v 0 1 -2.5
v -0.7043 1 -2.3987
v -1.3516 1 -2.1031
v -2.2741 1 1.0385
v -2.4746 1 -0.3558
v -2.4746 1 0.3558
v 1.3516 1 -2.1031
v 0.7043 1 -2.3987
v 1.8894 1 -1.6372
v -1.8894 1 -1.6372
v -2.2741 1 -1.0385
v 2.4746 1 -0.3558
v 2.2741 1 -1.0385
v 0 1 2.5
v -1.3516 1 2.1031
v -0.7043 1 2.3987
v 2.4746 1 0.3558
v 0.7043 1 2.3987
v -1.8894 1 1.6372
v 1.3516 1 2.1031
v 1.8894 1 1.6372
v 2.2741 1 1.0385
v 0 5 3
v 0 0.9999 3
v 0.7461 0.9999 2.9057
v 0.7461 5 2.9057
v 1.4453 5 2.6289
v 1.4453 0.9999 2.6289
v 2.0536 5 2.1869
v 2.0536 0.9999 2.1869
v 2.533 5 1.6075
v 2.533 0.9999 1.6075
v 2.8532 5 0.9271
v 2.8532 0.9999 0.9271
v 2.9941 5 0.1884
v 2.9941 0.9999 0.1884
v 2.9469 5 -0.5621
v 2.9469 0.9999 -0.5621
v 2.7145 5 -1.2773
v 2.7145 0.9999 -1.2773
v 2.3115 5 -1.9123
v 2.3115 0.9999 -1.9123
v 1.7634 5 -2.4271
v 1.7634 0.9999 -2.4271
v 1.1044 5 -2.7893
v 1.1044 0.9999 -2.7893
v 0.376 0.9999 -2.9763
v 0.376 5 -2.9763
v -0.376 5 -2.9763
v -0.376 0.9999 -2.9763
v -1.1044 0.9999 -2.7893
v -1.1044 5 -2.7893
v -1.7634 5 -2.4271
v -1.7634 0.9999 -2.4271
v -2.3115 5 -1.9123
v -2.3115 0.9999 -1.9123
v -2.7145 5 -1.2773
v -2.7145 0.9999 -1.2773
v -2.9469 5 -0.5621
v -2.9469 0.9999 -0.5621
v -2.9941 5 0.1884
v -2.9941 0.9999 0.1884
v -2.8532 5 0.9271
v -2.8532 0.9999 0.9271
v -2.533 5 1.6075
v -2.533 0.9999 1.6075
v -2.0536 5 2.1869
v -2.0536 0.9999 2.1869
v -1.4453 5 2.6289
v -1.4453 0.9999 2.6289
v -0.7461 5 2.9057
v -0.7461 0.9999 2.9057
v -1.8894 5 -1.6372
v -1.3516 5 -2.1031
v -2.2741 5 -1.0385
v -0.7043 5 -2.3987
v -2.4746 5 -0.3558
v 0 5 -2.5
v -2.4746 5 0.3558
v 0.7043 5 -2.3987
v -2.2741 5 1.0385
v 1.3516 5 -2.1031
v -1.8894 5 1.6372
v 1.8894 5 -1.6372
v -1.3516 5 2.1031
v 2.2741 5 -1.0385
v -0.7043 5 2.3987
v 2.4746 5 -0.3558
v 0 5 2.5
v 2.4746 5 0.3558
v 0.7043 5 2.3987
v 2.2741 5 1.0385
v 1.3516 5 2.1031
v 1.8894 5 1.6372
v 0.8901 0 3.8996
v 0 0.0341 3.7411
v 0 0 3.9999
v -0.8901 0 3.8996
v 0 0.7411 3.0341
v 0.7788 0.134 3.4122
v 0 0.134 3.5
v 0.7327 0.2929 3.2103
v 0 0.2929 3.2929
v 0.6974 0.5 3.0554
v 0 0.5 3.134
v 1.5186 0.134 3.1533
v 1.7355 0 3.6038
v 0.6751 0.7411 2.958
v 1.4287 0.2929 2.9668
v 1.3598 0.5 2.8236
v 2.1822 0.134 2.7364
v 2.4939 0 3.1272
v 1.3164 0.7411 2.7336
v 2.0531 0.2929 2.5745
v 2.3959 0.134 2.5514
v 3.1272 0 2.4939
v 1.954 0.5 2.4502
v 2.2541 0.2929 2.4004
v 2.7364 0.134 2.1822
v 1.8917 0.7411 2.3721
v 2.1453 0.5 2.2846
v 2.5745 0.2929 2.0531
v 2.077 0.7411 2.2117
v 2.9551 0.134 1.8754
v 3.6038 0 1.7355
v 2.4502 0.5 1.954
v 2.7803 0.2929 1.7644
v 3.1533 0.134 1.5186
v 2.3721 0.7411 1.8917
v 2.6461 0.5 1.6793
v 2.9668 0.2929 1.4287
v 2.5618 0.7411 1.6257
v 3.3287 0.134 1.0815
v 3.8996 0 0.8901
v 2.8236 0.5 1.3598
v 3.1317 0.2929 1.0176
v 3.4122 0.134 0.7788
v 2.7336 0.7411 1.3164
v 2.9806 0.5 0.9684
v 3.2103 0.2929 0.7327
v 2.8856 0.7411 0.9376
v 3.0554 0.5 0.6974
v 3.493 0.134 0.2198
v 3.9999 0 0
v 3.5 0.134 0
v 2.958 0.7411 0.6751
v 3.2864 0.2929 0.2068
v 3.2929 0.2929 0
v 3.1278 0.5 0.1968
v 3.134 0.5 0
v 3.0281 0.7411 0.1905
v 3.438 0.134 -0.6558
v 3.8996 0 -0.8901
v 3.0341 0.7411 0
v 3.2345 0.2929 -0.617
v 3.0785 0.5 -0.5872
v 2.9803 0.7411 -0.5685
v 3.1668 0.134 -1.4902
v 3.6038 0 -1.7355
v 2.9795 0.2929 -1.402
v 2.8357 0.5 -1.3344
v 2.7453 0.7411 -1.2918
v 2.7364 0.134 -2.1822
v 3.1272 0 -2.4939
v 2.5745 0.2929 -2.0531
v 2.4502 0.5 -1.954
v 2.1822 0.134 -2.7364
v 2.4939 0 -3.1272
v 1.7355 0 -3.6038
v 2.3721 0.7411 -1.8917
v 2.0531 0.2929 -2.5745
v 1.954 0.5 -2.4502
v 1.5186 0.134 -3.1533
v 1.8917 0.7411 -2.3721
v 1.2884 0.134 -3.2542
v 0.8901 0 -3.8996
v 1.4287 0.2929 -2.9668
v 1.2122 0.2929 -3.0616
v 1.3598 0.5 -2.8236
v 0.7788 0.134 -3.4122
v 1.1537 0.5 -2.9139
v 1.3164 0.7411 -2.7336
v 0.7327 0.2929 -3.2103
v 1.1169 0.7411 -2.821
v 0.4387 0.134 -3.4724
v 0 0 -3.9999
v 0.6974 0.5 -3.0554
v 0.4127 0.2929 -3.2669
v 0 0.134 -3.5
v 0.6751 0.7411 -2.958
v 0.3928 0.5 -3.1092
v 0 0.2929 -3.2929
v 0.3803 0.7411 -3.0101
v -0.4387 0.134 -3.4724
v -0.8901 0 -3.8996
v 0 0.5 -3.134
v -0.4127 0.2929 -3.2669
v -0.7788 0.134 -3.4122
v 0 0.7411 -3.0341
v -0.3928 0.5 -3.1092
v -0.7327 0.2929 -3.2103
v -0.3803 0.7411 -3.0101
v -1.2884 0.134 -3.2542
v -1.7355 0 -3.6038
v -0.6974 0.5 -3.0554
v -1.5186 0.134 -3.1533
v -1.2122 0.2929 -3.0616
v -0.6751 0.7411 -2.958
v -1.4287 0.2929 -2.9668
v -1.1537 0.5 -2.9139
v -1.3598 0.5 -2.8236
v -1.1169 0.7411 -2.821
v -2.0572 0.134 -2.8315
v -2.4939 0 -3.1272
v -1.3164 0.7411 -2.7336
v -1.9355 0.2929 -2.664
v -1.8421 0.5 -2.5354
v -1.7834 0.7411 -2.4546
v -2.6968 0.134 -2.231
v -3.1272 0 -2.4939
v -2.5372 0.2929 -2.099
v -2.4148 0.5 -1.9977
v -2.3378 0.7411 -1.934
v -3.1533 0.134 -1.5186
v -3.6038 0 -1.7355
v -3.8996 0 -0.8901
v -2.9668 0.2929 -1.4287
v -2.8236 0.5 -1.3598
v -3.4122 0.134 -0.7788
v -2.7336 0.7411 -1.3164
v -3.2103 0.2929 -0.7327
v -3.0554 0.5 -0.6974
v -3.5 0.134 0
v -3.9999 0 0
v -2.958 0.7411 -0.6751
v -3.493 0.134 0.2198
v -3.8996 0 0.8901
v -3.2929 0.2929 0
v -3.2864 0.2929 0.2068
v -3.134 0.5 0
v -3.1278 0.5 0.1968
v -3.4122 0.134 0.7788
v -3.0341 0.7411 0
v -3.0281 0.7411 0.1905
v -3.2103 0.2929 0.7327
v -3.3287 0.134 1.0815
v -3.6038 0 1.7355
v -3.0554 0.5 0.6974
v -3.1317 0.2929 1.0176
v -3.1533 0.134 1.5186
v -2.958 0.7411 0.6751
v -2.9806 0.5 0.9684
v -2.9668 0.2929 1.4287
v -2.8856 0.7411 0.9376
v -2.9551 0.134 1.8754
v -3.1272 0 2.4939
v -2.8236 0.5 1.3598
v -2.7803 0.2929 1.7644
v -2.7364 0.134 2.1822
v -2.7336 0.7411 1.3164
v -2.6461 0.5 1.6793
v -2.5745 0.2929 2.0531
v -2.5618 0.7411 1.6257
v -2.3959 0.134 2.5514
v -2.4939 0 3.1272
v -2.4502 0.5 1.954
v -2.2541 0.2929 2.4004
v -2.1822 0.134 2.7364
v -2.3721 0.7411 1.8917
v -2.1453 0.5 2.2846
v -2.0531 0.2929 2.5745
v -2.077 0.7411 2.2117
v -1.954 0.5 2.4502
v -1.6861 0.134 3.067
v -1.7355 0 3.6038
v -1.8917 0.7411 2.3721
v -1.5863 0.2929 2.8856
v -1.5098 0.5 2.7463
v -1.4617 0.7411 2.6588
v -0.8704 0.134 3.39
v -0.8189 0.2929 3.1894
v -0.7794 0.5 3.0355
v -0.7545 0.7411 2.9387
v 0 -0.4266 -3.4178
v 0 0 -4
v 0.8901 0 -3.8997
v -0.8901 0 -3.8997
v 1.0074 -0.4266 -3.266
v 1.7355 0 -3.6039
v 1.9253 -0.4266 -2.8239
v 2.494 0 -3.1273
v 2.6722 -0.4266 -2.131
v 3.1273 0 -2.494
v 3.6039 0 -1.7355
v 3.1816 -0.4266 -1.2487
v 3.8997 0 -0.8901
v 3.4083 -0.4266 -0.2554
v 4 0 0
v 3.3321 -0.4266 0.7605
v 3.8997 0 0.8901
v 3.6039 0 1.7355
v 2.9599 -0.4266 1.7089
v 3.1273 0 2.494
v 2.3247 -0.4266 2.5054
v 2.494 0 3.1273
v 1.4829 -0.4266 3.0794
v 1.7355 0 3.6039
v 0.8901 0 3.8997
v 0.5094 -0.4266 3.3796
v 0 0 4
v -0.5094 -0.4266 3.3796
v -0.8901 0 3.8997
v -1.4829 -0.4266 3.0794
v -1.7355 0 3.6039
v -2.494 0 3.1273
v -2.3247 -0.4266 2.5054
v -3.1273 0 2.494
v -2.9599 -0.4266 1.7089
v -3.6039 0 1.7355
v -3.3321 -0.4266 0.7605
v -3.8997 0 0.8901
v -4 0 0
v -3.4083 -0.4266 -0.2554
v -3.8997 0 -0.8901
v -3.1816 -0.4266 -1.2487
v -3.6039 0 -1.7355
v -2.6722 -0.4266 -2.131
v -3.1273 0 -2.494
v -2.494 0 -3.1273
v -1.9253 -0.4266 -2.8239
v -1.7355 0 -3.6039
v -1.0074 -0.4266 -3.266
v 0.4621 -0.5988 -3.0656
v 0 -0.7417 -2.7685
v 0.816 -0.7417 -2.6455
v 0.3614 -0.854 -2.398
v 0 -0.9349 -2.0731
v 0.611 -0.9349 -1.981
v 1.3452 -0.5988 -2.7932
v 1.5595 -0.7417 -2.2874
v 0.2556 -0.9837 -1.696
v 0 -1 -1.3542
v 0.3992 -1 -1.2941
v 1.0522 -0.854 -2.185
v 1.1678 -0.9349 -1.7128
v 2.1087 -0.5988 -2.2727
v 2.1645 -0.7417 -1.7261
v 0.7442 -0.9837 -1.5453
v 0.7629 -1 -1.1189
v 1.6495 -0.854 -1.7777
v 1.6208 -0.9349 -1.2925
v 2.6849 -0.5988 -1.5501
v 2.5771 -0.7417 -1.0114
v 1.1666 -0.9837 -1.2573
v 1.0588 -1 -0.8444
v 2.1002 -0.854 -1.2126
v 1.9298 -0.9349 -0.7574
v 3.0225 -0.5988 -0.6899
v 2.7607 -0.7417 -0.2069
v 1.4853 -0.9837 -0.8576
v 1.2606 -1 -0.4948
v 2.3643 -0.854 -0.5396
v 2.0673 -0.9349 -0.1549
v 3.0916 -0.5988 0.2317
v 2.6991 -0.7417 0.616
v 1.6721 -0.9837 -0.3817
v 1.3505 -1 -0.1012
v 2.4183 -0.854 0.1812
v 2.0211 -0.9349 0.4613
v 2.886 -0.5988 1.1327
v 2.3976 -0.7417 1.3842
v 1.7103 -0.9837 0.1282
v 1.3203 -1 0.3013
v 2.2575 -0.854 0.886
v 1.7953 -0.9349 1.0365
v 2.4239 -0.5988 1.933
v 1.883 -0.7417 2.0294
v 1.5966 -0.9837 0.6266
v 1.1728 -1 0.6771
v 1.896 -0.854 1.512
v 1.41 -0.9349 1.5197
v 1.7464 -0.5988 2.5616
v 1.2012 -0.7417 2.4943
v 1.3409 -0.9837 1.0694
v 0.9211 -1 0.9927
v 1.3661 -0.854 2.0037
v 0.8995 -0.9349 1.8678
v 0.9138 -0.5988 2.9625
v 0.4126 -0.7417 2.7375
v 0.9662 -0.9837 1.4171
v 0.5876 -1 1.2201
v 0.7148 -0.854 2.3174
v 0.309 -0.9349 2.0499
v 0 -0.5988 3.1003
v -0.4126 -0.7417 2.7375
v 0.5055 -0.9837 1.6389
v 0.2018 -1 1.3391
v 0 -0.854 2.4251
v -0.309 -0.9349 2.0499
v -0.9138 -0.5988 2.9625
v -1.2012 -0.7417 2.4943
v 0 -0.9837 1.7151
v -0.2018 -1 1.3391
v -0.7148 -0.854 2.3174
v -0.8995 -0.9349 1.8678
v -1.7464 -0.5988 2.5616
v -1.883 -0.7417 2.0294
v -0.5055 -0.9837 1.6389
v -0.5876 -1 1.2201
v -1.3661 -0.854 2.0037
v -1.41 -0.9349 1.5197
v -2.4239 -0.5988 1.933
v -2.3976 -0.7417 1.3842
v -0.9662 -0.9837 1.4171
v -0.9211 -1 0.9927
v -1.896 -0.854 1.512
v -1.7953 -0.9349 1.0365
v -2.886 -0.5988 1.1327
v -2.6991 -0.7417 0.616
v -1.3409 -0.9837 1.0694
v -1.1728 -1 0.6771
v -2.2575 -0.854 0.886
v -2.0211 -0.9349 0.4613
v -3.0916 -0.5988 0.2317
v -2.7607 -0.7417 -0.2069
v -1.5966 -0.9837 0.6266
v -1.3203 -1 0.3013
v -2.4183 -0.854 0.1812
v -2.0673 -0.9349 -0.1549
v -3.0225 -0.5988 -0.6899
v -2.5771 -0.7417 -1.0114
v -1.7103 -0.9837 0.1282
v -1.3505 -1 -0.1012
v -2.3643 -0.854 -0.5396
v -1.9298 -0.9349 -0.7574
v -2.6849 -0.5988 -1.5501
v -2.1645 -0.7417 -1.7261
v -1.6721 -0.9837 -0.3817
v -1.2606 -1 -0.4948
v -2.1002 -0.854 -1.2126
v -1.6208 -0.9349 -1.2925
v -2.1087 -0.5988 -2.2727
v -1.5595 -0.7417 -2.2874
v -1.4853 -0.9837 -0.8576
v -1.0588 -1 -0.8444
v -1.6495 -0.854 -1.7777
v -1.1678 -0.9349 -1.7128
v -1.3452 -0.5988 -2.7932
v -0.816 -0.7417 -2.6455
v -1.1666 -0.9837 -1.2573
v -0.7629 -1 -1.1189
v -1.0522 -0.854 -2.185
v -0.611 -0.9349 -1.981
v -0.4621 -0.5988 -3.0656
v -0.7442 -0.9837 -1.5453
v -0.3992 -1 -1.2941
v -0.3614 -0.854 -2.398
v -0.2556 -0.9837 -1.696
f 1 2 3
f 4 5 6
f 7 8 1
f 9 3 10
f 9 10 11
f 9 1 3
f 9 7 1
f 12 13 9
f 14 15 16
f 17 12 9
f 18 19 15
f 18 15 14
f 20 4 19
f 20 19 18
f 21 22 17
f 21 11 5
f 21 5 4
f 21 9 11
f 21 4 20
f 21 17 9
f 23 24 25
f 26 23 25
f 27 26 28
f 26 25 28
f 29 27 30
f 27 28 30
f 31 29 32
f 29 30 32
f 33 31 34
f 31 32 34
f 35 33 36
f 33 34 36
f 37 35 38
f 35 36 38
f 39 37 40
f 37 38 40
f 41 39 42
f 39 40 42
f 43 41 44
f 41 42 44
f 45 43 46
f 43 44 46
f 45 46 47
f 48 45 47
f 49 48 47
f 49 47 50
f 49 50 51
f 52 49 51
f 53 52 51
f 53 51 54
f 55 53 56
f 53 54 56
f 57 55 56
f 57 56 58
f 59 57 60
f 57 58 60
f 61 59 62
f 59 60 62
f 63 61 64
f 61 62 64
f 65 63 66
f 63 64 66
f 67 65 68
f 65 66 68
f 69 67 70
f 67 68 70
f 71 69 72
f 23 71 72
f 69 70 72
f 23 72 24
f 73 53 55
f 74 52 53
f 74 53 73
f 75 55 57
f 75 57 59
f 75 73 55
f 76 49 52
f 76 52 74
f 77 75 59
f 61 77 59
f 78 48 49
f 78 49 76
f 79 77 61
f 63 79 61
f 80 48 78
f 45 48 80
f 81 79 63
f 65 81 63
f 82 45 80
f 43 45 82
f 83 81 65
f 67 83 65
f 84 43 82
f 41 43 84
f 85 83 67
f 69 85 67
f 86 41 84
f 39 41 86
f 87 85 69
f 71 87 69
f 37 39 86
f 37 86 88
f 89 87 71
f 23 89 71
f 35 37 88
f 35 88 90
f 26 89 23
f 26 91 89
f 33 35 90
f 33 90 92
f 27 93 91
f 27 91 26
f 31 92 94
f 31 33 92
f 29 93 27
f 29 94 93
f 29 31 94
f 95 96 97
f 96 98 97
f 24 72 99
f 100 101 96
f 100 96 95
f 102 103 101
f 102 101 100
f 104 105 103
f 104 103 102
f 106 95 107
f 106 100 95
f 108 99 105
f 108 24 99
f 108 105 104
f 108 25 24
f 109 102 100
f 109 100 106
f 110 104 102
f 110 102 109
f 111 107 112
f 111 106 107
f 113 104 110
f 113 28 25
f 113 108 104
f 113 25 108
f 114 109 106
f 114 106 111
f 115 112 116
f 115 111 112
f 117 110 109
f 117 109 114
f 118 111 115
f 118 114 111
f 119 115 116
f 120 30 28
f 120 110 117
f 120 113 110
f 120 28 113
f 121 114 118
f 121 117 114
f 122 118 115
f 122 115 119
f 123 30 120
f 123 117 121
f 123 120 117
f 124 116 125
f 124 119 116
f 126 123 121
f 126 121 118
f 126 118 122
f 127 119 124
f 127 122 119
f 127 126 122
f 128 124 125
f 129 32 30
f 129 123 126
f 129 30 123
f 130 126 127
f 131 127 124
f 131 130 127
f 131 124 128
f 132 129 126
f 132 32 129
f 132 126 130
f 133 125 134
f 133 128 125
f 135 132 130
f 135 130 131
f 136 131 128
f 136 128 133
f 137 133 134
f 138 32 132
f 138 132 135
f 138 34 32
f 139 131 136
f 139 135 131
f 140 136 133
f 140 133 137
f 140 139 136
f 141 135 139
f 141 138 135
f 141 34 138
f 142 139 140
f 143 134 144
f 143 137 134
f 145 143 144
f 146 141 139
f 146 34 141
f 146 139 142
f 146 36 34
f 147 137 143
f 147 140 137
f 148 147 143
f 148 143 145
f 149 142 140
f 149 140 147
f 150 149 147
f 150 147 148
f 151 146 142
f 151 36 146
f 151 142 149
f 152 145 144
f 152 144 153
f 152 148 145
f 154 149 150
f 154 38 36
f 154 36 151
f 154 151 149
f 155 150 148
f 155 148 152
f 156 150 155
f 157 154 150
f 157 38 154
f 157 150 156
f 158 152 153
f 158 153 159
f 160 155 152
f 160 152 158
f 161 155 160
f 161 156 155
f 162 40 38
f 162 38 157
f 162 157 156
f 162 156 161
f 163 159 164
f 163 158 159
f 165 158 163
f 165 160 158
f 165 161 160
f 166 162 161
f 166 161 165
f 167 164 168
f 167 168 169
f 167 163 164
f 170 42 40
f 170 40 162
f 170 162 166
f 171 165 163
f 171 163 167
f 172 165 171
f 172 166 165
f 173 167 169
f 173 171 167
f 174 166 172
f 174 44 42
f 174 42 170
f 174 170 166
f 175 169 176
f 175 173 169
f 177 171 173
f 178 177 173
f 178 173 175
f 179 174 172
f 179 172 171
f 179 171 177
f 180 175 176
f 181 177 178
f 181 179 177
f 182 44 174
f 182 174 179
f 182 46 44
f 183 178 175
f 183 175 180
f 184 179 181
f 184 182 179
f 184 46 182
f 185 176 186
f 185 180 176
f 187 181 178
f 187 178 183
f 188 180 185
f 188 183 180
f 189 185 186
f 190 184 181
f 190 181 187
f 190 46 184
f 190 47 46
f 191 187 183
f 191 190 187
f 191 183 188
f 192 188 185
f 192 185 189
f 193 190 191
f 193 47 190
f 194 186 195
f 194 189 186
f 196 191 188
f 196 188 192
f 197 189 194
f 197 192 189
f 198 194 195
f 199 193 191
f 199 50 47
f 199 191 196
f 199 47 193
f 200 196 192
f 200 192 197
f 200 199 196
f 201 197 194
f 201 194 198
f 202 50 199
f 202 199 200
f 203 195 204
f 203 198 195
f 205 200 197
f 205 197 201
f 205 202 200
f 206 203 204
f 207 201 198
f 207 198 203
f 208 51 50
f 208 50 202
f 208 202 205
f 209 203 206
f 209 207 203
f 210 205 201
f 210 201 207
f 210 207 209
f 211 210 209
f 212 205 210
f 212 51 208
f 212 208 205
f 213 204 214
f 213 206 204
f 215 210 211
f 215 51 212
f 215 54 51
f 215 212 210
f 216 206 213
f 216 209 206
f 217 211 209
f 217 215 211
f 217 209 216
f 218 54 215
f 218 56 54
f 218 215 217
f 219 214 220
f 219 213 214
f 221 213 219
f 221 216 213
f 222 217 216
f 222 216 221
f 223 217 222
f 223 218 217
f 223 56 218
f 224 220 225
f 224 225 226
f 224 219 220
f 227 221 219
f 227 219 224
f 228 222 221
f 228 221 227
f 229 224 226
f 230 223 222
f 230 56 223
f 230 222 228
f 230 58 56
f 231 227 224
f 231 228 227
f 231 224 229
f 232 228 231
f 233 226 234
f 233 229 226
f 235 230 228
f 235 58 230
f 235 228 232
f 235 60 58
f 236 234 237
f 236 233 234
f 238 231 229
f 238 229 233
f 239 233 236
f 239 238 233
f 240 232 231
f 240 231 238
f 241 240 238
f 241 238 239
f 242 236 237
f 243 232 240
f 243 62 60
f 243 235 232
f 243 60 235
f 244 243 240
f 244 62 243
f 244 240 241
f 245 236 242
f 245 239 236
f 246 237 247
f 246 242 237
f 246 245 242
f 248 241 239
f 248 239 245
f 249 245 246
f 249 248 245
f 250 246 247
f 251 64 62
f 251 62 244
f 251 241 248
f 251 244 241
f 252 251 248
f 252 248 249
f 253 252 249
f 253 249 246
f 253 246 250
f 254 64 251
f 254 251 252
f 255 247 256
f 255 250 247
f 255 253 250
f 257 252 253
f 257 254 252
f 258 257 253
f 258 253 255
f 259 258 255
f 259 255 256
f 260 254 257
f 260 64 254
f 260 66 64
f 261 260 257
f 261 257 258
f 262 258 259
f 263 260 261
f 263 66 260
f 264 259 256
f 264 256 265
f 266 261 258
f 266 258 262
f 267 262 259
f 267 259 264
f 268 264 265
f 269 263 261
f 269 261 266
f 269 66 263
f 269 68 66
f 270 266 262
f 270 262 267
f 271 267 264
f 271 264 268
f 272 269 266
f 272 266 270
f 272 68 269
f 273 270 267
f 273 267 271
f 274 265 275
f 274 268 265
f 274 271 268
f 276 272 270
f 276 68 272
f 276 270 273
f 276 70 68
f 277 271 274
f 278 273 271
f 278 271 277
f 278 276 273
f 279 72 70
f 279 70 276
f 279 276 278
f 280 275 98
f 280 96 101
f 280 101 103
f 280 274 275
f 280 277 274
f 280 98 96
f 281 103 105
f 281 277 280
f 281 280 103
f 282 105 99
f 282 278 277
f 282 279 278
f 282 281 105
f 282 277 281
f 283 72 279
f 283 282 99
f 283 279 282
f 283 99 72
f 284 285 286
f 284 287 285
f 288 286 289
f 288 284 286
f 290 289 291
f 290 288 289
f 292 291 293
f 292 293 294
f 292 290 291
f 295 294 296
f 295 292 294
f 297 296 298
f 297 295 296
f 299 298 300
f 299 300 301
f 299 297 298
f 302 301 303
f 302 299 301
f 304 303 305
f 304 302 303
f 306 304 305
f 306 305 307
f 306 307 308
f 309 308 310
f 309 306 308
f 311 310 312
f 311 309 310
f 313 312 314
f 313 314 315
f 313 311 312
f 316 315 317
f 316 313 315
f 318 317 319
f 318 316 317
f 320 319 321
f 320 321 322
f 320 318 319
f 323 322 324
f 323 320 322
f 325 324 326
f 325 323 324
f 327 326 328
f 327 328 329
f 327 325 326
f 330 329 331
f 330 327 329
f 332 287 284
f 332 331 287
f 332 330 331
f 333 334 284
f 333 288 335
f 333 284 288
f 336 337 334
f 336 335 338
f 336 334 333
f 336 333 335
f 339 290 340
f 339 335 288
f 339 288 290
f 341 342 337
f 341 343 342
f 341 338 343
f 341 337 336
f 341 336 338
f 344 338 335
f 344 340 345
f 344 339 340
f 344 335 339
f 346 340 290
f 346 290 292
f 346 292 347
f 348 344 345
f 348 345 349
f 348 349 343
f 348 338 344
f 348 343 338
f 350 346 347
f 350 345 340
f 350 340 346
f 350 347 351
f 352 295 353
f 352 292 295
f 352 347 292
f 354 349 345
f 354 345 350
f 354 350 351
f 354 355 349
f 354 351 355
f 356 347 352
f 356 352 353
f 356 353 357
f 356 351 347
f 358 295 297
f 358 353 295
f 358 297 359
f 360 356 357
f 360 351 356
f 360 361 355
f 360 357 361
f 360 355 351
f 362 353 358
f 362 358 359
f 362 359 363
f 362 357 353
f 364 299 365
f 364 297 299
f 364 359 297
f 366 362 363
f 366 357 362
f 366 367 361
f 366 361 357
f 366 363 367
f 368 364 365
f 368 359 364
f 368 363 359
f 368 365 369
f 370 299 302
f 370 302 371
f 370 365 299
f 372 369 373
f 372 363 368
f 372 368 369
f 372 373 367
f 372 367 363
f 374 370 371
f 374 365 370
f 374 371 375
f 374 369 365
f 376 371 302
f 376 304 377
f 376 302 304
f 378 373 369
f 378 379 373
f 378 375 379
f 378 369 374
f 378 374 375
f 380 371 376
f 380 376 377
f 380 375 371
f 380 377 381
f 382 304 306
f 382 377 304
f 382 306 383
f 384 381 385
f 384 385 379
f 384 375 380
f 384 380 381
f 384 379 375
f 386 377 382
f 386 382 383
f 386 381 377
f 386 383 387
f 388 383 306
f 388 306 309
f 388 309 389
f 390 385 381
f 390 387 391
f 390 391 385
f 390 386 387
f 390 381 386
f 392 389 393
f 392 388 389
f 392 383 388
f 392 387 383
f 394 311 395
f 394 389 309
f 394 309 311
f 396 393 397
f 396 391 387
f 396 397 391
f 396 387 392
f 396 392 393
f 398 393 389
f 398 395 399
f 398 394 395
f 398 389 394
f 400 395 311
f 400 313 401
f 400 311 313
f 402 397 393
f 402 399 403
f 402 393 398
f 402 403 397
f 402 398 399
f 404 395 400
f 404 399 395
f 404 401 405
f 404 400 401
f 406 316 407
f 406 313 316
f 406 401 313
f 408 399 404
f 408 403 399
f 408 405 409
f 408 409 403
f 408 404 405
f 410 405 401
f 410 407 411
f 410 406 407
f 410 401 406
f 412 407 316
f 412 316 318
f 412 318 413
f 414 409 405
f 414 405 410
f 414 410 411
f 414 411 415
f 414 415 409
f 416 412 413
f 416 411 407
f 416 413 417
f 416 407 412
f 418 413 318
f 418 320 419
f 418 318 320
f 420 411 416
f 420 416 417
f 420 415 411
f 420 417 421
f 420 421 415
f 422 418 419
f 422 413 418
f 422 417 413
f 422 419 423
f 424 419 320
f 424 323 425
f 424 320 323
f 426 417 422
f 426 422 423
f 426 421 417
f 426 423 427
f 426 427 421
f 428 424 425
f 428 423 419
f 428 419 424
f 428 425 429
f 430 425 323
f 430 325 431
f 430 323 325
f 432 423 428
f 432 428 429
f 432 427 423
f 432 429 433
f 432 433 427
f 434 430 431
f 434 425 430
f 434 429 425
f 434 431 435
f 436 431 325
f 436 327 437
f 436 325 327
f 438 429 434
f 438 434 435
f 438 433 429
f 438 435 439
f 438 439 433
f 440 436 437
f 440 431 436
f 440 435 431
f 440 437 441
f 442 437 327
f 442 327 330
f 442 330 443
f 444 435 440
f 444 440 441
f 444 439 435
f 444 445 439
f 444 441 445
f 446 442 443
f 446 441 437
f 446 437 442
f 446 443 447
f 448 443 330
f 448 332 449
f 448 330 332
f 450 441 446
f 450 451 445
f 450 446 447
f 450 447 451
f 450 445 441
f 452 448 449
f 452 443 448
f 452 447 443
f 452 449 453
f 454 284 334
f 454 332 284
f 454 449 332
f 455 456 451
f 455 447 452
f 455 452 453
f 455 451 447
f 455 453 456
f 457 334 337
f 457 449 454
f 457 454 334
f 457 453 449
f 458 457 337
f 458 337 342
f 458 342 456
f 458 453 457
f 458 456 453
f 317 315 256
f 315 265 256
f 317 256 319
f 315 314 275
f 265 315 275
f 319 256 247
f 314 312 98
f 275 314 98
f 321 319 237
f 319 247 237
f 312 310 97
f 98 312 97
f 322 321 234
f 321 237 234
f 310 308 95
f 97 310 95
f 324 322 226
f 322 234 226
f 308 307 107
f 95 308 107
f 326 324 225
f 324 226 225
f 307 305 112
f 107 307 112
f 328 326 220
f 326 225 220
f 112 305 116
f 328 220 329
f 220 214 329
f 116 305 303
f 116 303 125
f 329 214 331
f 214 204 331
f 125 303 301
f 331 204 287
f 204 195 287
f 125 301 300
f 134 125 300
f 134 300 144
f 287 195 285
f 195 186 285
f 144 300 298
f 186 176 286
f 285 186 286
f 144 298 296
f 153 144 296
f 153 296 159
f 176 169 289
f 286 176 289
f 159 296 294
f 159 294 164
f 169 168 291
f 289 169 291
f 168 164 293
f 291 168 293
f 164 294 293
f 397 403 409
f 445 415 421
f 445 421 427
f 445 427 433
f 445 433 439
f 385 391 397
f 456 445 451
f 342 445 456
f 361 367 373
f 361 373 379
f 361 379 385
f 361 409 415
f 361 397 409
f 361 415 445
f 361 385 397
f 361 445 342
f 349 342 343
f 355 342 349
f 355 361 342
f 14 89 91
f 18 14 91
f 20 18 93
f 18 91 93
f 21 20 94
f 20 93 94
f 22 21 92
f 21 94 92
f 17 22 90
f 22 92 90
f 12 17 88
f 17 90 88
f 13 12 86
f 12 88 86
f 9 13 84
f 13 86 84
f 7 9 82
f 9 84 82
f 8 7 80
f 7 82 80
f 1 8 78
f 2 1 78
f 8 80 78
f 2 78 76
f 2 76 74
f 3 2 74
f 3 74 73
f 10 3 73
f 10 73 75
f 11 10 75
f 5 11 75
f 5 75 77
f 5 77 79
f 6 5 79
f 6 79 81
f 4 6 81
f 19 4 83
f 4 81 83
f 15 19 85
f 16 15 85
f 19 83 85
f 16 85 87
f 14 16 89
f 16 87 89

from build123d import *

# Parameters (mm, degrees)
SKETCH1_R           = 3
BOSS_EXTRUDE1_DEPTH = 5
SKETCH2_R           = 2.5
CUT_EXTRUDE1_DEPTH  = 4
SKETCH3_R           = 4
BOSS_EXTRUDE3_DEPTH = 1
FILLET2_R           = 1
FILLET3_R           = 4


# Some blends are built 0.0001 mm under size
with BuildPart() as part:
    # Sketch1 → Boss-Extrude1 (new body)
    with BuildSketch(Plane(origin=(0, 0, 0), x_dir=(1, 0, 0), z_dir=(0, 1, 0))):
        with Locations(Location((0, 0, 0), (0, 0, 270))):
            Circle(SKETCH1_R)
    extrude(amount=BOSS_EXTRUDE1_DEPTH)

    # Sketch2 → Cut-Extrude1 (cut)
    with BuildSketch(Plane(origin=(0, 5, 0), x_dir=(1, 0, 0), z_dir=(0, 1, 0))):
        with Locations(Location((0, 0, 0), (0, 0, 270))):
            Circle(SKETCH2_R)
    extrude(amount=-CUT_EXTRUDE1_DEPTH, mode=Mode.SUBTRACT)

    # Sketch3 → Boss-Extrude3 (add)
    with BuildSketch(Plane.XZ):
        with Locations(Location((0, 0, 0), (0, 0, 270))):
            Circle(SKETCH3_R)
    extrude(amount=BOSS_EXTRUDE3_DEPTH)

    # Fillet2
    fillet2_edges = [part.edges().sort_by_distance(p)[0] for p in [
        (0, 0, -3),
    ]]
    fillet(fillet2_edges, radius=FILLET2_R - 0.0001)  # a hair under: the kernel refuses the full size

    # Fillet3
    # the kernel refuses this fillet: 4 mm, written as the material it takes off along each edge
    with BuildSketch(Plane(origin=(0, -1, 0), x_dir=(0, 0, -1), z_dir=(-1, 0, 0))) as fillet3_piece_1:
        with BuildLine():
            CenterArc((1.354248689, -4), FILLET3_R, 48.590377891, 41.409622109)
            Line((1.354248689, 0), (1.354248689, 0.08))
            Line((1.354248689, 0.08), (4, 0.08))
            Line((4, 0.08), (4.08, 0))
            ThreePointArc((4.08, 0), (4.08, -0.5), (4.052915026, -0.94))
            Line((4.052915026, -0.94), (4, -1))
        make_face()
    revolve(axis=Axis((0, -1, 0), (0, -1, 0)), mode=Mode.SUBTRACT)


solid = part.part
